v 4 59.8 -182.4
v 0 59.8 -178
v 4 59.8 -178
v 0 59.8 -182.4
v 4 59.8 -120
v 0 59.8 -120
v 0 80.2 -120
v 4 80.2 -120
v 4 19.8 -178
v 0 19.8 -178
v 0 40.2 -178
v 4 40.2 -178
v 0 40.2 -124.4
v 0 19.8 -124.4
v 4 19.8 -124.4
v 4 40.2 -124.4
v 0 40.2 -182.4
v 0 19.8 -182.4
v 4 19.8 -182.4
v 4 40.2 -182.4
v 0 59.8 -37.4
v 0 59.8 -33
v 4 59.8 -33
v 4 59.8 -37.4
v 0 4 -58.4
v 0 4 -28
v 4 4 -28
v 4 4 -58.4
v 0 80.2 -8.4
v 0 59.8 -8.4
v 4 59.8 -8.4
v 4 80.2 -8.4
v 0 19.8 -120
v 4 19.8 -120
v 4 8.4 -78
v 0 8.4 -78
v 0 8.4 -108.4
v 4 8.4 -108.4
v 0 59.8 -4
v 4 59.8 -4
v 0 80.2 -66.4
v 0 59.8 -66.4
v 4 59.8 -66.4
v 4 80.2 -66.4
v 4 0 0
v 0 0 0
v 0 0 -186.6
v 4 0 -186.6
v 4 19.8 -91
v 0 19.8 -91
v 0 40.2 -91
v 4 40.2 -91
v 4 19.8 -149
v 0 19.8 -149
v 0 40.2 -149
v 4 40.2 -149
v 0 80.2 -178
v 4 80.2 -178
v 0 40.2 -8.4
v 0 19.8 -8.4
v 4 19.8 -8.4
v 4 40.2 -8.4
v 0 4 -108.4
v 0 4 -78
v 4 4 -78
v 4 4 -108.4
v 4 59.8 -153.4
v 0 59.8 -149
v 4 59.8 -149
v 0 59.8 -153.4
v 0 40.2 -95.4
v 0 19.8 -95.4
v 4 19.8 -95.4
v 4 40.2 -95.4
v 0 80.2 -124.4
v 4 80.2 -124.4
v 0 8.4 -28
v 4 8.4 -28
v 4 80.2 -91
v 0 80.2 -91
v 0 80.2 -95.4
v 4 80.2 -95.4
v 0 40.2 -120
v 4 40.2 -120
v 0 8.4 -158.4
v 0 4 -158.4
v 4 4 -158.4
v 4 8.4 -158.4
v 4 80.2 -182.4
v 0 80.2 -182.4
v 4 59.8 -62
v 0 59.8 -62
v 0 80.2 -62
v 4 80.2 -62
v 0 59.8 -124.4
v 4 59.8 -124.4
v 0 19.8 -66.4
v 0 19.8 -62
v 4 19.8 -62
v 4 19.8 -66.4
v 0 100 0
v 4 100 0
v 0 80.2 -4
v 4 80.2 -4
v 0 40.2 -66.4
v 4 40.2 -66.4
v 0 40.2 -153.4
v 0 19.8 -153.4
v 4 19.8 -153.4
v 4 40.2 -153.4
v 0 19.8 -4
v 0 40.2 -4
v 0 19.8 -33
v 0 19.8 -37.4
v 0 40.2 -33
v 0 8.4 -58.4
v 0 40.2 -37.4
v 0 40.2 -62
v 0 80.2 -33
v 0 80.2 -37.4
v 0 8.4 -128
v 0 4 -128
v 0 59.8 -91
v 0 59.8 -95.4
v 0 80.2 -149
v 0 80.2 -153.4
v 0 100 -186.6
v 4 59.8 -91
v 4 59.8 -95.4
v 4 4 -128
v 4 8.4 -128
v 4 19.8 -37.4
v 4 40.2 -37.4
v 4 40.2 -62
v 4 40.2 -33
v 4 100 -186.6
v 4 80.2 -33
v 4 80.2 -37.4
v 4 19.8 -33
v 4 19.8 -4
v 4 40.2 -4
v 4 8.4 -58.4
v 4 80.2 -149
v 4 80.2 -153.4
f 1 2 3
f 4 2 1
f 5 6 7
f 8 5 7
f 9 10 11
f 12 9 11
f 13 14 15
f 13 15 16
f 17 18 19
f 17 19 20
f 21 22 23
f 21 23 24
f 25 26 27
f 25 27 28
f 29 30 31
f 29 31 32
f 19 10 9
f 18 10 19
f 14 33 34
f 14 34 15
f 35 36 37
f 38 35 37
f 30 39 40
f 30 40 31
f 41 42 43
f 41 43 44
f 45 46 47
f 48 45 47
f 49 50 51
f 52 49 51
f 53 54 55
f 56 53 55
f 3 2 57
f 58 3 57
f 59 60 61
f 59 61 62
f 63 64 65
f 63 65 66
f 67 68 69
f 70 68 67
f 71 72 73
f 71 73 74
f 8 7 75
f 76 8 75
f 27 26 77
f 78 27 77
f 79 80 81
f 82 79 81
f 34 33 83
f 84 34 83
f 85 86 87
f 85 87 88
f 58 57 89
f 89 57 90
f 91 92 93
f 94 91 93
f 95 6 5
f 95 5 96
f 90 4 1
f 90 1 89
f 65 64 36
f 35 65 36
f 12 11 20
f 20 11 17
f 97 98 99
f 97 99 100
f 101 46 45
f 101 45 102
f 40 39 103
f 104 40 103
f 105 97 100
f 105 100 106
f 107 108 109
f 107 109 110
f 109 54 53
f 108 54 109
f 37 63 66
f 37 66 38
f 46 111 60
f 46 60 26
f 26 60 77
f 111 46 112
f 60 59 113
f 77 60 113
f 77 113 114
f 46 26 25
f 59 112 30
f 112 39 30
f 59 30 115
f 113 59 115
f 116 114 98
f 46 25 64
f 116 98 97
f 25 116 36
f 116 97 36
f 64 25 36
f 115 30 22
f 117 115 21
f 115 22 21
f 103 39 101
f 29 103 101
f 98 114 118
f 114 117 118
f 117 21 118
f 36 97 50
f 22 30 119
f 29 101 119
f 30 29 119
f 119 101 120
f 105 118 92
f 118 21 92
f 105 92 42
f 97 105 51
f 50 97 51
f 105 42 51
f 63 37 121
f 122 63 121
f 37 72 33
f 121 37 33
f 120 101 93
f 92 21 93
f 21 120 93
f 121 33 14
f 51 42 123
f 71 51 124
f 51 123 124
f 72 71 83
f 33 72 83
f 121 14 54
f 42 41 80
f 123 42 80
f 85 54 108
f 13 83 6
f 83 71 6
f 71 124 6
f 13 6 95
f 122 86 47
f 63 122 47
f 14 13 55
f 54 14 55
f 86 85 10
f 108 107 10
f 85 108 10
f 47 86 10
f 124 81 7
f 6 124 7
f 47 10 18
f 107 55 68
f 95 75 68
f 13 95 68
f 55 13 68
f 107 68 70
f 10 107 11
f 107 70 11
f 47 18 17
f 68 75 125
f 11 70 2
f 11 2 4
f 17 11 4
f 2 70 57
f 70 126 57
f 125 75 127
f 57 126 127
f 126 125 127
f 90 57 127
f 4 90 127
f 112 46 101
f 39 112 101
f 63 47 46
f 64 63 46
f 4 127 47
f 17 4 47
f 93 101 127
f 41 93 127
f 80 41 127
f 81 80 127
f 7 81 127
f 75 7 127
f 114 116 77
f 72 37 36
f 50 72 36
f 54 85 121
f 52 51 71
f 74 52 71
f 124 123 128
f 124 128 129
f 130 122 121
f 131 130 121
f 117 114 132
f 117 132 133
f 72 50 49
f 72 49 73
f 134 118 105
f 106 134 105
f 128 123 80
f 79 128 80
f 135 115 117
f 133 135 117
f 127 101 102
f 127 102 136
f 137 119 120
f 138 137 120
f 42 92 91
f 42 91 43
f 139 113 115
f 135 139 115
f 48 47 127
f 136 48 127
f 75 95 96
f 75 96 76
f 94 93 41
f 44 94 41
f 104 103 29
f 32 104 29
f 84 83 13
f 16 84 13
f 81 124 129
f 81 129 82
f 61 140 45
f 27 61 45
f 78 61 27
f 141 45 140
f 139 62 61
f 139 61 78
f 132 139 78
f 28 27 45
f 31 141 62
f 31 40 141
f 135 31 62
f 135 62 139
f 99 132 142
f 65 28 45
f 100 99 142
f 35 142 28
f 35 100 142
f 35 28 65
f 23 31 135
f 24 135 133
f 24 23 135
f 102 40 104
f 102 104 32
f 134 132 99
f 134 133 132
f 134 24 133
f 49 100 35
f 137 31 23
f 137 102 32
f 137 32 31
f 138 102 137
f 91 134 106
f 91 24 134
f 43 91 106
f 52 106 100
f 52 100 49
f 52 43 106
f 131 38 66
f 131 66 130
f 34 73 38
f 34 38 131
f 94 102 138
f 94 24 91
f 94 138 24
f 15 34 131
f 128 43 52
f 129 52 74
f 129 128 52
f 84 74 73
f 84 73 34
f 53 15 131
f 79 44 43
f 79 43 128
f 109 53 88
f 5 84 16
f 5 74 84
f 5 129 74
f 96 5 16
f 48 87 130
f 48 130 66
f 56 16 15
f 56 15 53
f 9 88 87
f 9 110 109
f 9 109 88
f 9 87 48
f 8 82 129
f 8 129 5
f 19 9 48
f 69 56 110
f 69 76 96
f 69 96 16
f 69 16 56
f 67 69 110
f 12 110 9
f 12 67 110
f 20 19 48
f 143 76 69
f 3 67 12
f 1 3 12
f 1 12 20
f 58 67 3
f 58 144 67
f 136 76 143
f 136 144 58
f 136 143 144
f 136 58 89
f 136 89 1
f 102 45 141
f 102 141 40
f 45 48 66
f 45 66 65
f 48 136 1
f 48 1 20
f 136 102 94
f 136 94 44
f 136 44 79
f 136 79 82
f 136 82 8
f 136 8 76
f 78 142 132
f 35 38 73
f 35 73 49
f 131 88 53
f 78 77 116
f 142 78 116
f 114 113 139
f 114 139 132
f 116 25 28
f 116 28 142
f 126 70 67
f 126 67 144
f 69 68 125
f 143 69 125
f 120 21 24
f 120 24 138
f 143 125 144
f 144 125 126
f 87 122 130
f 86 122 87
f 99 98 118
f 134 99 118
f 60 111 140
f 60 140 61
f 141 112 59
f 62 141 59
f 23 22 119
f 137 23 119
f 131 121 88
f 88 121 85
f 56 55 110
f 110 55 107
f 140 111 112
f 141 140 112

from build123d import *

# Parameters (mm, degrees)
SKETCH_1_W      = 186.6
SKETCH_1_H      = 100
SKETCH_1_W_2    = 4.4
SKETCH_1_H_2    = 20.4
SKETCH_1_W_3    = 30.4
SKETCH_1_H_3    = 4.4
EXTRUDE_1_DEPTH = 4


with BuildPart() as part:
    # Эскиз1 → Бобышка-Вытянуть1 (new body)
    with BuildSketch(Plane(origin=(0, 0, 0), x_dir=(0, 0, -1), z_dir=(1, 0, 0))):
        with Locations((93.3, 50)):
            Rectangle(SKETCH_1_W, SKETCH_1_H)
        with Locations((6.2, 30)):
            Rectangle(SKETCH_1_W_2, SKETCH_1_H_2, mode=Mode.SUBTRACT)
        with Locations((6.2, 70)):
            Rectangle(SKETCH_1_W_2, SKETCH_1_H_2, mode=Mode.SUBTRACT)
        with Locations((35.2, 70)):
            Rectangle(SKETCH_1_W_2, SKETCH_1_H_2, mode=Mode.SUBTRACT)
        with Locations((35.2, 30)):
            Rectangle(SKETCH_1_W_2, SKETCH_1_H_2, mode=Mode.SUBTRACT)
        with Locations((64.2, 70)):
            Rectangle(SKETCH_1_W_2, SKETCH_1_H_2, mode=Mode.SUBTRACT)
        with Locations((64.2, 30)):
            Rectangle(SKETCH_1_W_2, SKETCH_1_H_2, mode=Mode.SUBTRACT)
        with Locations((93.2, 70)):
            Rectangle(SKETCH_1_W_2, SKETCH_1_H_2, mode=Mode.SUBTRACT)
        with Locations((93.2, 30)):
            Rectangle(SKETCH_1_W_2, SKETCH_1_H_2, mode=Mode.SUBTRACT)
        with Locations((122.2, 70)):
            Rectangle(SKETCH_1_W_2, SKETCH_1_H_2, mode=Mode.SUBTRACT)
        with Locations((122.2, 30)):
            Rectangle(SKETCH_1_W_2, SKETCH_1_H_2, mode=Mode.SUBTRACT)
        with Locations((151.2, 70)):
            Rectangle(SKETCH_1_W_2, SKETCH_1_H_2, mode=Mode.SUBTRACT)
        with Locations((151.2, 30)):
            Rectangle(SKETCH_1_W_2, SKETCH_1_H_2, mode=Mode.SUBTRACT)
        with Locations((180.2, 70)):
            Rectangle(SKETCH_1_W_2, SKETCH_1_H_2, mode=Mode.SUBTRACT)
        with Locations((180.2, 30)):
            Rectangle(SKETCH_1_W_2, SKETCH_1_H_2, mode=Mode.SUBTRACT)
        with Locations((43.2, 6.2)):
            Rectangle(SKETCH_1_W_3, SKETCH_1_H_3, mode=Mode.SUBTRACT)
        with Locations((93.2, 6.2)):
            Rectangle(SKETCH_1_W_3, SKETCH_1_H_3, mode=Mode.SUBTRACT)
        with Locations((143.2, 6.2)):
            Rectangle(SKETCH_1_W_3, SKETCH_1_H_3, mode=Mode.SUBTRACT)
    extrude(amount=EXTRUDE_1_DEPTH)


solid = part.part
